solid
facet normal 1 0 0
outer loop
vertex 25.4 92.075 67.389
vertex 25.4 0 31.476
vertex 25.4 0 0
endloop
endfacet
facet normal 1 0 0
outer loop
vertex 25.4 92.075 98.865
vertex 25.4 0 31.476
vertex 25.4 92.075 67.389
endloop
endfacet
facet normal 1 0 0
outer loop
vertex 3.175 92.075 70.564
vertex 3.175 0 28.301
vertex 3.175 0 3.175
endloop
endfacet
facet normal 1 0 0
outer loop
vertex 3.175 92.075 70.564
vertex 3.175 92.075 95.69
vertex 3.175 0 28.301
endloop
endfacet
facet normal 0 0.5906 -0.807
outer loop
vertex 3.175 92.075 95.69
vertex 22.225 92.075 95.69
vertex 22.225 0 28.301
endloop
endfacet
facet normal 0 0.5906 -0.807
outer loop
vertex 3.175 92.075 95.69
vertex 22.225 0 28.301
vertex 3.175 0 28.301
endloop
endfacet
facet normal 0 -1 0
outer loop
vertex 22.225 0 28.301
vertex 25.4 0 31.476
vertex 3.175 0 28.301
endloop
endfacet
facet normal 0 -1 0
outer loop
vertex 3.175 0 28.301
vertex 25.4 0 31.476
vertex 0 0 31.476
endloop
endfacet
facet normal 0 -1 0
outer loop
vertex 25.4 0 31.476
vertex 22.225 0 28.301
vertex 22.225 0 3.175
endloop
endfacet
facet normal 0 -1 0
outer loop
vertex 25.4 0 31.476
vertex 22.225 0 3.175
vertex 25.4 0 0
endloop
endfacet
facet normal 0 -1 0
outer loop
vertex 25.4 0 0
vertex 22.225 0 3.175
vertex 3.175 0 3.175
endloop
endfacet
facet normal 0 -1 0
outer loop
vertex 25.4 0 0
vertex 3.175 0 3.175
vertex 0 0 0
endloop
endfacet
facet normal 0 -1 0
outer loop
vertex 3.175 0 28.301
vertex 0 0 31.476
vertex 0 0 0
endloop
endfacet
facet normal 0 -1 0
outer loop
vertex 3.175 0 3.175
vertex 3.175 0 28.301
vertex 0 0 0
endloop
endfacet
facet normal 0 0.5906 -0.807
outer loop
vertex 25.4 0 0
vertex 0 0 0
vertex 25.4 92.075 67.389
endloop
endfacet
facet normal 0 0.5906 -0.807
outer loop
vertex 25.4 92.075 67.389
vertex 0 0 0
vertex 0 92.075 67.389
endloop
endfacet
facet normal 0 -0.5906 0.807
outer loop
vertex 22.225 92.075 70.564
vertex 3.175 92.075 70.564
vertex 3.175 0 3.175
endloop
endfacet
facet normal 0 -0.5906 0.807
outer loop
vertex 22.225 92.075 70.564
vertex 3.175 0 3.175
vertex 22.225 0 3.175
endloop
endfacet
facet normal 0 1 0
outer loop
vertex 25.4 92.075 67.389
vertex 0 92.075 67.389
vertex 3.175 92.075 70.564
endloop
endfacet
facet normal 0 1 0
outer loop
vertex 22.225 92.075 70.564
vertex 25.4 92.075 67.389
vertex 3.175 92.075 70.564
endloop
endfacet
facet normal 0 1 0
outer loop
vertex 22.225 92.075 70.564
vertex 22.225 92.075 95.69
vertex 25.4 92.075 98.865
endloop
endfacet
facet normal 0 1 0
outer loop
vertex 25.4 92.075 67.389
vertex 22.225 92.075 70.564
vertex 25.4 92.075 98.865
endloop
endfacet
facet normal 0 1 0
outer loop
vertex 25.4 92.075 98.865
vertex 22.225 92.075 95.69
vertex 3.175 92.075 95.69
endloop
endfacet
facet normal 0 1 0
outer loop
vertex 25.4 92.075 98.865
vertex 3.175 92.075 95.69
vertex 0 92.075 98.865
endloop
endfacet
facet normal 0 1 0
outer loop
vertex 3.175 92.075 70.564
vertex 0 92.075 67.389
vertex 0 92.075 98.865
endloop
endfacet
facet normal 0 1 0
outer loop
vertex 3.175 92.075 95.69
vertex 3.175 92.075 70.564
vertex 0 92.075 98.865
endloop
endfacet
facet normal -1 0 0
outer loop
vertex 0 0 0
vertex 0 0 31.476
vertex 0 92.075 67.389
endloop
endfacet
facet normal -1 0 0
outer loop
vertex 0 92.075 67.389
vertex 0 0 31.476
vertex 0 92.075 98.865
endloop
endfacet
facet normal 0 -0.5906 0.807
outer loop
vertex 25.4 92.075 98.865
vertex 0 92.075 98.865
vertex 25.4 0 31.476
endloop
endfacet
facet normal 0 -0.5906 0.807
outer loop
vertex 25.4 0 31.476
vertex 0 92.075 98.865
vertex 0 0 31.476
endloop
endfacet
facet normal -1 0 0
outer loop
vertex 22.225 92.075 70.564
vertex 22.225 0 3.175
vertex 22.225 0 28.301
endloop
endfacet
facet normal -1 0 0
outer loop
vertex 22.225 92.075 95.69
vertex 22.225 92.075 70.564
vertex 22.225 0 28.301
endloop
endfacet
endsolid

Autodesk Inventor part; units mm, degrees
ref_plane "YZ Plane" through (0, 0, 0) normal (1, 0, 0) x (0, 1, 0)
ref_plane "XZ Plane" through (0, 0, 0) normal (0, 1, 0) x (-1, 0, 0)
ref_plane "XY Plane" through (0, 0, 0) normal (0, 0, 1) x (1, 0, 0)
sketch "Sketch1" plane through (0, 0, 0) normal (1, 0, 0) x (0, 1, 0)
  line L0 (0, 0) -> (92.075, 67.3887)
  line L1 (92.075, 67.3887) -> (92.075, 98.8649)
  line L2 (92.075, 98.8649) -> (0, 31.4761)
  line L3 (0, 31.4761) -> (0, 0)
  dimension "d0" = 53.8
  dimension "d2" = 25.4
  dimension "d3" = 92.075
extrude "Extrusion1" add sketch "Sketch1" along normal blind 25.4
sketch "Sketch3" plane through (0, 0, 0) normal (0, -1, 0) x (1, 0, 0)
  line L0 (22.225, 28.3011) -> (3.175, 28.3011)
  line L1 (3.175, 28.3011) -> (3.175, 3.175)
  line L2 (3.175, 3.175) -> (22.225, 3.175)
  line L3 (22.225, 3.175) -> (22.225, 28.3011)
  line L4 (0, 31.4761) -> (25.4, 31.4761) projected
  line L5 (25.4, 0) -> (25.4, 67.3887) projected
  line L6 (0, 0) -> (25.4, 0) projected
  dimension "d10" = 19.05
  dimension "d12" = 3.175
  dimension "d13" = 3.175
  dimension "d16" = 3.175
sketch3d "3D Sketch1"
  line L0 (25.4, 0, 31.4761) -> (25.4, 92.075, 98.8649)
sweep "Sweep2" cut profiles "Sketch3" path "3D Sketch1"
properties part number "Arm Platform Diagonal strut"
